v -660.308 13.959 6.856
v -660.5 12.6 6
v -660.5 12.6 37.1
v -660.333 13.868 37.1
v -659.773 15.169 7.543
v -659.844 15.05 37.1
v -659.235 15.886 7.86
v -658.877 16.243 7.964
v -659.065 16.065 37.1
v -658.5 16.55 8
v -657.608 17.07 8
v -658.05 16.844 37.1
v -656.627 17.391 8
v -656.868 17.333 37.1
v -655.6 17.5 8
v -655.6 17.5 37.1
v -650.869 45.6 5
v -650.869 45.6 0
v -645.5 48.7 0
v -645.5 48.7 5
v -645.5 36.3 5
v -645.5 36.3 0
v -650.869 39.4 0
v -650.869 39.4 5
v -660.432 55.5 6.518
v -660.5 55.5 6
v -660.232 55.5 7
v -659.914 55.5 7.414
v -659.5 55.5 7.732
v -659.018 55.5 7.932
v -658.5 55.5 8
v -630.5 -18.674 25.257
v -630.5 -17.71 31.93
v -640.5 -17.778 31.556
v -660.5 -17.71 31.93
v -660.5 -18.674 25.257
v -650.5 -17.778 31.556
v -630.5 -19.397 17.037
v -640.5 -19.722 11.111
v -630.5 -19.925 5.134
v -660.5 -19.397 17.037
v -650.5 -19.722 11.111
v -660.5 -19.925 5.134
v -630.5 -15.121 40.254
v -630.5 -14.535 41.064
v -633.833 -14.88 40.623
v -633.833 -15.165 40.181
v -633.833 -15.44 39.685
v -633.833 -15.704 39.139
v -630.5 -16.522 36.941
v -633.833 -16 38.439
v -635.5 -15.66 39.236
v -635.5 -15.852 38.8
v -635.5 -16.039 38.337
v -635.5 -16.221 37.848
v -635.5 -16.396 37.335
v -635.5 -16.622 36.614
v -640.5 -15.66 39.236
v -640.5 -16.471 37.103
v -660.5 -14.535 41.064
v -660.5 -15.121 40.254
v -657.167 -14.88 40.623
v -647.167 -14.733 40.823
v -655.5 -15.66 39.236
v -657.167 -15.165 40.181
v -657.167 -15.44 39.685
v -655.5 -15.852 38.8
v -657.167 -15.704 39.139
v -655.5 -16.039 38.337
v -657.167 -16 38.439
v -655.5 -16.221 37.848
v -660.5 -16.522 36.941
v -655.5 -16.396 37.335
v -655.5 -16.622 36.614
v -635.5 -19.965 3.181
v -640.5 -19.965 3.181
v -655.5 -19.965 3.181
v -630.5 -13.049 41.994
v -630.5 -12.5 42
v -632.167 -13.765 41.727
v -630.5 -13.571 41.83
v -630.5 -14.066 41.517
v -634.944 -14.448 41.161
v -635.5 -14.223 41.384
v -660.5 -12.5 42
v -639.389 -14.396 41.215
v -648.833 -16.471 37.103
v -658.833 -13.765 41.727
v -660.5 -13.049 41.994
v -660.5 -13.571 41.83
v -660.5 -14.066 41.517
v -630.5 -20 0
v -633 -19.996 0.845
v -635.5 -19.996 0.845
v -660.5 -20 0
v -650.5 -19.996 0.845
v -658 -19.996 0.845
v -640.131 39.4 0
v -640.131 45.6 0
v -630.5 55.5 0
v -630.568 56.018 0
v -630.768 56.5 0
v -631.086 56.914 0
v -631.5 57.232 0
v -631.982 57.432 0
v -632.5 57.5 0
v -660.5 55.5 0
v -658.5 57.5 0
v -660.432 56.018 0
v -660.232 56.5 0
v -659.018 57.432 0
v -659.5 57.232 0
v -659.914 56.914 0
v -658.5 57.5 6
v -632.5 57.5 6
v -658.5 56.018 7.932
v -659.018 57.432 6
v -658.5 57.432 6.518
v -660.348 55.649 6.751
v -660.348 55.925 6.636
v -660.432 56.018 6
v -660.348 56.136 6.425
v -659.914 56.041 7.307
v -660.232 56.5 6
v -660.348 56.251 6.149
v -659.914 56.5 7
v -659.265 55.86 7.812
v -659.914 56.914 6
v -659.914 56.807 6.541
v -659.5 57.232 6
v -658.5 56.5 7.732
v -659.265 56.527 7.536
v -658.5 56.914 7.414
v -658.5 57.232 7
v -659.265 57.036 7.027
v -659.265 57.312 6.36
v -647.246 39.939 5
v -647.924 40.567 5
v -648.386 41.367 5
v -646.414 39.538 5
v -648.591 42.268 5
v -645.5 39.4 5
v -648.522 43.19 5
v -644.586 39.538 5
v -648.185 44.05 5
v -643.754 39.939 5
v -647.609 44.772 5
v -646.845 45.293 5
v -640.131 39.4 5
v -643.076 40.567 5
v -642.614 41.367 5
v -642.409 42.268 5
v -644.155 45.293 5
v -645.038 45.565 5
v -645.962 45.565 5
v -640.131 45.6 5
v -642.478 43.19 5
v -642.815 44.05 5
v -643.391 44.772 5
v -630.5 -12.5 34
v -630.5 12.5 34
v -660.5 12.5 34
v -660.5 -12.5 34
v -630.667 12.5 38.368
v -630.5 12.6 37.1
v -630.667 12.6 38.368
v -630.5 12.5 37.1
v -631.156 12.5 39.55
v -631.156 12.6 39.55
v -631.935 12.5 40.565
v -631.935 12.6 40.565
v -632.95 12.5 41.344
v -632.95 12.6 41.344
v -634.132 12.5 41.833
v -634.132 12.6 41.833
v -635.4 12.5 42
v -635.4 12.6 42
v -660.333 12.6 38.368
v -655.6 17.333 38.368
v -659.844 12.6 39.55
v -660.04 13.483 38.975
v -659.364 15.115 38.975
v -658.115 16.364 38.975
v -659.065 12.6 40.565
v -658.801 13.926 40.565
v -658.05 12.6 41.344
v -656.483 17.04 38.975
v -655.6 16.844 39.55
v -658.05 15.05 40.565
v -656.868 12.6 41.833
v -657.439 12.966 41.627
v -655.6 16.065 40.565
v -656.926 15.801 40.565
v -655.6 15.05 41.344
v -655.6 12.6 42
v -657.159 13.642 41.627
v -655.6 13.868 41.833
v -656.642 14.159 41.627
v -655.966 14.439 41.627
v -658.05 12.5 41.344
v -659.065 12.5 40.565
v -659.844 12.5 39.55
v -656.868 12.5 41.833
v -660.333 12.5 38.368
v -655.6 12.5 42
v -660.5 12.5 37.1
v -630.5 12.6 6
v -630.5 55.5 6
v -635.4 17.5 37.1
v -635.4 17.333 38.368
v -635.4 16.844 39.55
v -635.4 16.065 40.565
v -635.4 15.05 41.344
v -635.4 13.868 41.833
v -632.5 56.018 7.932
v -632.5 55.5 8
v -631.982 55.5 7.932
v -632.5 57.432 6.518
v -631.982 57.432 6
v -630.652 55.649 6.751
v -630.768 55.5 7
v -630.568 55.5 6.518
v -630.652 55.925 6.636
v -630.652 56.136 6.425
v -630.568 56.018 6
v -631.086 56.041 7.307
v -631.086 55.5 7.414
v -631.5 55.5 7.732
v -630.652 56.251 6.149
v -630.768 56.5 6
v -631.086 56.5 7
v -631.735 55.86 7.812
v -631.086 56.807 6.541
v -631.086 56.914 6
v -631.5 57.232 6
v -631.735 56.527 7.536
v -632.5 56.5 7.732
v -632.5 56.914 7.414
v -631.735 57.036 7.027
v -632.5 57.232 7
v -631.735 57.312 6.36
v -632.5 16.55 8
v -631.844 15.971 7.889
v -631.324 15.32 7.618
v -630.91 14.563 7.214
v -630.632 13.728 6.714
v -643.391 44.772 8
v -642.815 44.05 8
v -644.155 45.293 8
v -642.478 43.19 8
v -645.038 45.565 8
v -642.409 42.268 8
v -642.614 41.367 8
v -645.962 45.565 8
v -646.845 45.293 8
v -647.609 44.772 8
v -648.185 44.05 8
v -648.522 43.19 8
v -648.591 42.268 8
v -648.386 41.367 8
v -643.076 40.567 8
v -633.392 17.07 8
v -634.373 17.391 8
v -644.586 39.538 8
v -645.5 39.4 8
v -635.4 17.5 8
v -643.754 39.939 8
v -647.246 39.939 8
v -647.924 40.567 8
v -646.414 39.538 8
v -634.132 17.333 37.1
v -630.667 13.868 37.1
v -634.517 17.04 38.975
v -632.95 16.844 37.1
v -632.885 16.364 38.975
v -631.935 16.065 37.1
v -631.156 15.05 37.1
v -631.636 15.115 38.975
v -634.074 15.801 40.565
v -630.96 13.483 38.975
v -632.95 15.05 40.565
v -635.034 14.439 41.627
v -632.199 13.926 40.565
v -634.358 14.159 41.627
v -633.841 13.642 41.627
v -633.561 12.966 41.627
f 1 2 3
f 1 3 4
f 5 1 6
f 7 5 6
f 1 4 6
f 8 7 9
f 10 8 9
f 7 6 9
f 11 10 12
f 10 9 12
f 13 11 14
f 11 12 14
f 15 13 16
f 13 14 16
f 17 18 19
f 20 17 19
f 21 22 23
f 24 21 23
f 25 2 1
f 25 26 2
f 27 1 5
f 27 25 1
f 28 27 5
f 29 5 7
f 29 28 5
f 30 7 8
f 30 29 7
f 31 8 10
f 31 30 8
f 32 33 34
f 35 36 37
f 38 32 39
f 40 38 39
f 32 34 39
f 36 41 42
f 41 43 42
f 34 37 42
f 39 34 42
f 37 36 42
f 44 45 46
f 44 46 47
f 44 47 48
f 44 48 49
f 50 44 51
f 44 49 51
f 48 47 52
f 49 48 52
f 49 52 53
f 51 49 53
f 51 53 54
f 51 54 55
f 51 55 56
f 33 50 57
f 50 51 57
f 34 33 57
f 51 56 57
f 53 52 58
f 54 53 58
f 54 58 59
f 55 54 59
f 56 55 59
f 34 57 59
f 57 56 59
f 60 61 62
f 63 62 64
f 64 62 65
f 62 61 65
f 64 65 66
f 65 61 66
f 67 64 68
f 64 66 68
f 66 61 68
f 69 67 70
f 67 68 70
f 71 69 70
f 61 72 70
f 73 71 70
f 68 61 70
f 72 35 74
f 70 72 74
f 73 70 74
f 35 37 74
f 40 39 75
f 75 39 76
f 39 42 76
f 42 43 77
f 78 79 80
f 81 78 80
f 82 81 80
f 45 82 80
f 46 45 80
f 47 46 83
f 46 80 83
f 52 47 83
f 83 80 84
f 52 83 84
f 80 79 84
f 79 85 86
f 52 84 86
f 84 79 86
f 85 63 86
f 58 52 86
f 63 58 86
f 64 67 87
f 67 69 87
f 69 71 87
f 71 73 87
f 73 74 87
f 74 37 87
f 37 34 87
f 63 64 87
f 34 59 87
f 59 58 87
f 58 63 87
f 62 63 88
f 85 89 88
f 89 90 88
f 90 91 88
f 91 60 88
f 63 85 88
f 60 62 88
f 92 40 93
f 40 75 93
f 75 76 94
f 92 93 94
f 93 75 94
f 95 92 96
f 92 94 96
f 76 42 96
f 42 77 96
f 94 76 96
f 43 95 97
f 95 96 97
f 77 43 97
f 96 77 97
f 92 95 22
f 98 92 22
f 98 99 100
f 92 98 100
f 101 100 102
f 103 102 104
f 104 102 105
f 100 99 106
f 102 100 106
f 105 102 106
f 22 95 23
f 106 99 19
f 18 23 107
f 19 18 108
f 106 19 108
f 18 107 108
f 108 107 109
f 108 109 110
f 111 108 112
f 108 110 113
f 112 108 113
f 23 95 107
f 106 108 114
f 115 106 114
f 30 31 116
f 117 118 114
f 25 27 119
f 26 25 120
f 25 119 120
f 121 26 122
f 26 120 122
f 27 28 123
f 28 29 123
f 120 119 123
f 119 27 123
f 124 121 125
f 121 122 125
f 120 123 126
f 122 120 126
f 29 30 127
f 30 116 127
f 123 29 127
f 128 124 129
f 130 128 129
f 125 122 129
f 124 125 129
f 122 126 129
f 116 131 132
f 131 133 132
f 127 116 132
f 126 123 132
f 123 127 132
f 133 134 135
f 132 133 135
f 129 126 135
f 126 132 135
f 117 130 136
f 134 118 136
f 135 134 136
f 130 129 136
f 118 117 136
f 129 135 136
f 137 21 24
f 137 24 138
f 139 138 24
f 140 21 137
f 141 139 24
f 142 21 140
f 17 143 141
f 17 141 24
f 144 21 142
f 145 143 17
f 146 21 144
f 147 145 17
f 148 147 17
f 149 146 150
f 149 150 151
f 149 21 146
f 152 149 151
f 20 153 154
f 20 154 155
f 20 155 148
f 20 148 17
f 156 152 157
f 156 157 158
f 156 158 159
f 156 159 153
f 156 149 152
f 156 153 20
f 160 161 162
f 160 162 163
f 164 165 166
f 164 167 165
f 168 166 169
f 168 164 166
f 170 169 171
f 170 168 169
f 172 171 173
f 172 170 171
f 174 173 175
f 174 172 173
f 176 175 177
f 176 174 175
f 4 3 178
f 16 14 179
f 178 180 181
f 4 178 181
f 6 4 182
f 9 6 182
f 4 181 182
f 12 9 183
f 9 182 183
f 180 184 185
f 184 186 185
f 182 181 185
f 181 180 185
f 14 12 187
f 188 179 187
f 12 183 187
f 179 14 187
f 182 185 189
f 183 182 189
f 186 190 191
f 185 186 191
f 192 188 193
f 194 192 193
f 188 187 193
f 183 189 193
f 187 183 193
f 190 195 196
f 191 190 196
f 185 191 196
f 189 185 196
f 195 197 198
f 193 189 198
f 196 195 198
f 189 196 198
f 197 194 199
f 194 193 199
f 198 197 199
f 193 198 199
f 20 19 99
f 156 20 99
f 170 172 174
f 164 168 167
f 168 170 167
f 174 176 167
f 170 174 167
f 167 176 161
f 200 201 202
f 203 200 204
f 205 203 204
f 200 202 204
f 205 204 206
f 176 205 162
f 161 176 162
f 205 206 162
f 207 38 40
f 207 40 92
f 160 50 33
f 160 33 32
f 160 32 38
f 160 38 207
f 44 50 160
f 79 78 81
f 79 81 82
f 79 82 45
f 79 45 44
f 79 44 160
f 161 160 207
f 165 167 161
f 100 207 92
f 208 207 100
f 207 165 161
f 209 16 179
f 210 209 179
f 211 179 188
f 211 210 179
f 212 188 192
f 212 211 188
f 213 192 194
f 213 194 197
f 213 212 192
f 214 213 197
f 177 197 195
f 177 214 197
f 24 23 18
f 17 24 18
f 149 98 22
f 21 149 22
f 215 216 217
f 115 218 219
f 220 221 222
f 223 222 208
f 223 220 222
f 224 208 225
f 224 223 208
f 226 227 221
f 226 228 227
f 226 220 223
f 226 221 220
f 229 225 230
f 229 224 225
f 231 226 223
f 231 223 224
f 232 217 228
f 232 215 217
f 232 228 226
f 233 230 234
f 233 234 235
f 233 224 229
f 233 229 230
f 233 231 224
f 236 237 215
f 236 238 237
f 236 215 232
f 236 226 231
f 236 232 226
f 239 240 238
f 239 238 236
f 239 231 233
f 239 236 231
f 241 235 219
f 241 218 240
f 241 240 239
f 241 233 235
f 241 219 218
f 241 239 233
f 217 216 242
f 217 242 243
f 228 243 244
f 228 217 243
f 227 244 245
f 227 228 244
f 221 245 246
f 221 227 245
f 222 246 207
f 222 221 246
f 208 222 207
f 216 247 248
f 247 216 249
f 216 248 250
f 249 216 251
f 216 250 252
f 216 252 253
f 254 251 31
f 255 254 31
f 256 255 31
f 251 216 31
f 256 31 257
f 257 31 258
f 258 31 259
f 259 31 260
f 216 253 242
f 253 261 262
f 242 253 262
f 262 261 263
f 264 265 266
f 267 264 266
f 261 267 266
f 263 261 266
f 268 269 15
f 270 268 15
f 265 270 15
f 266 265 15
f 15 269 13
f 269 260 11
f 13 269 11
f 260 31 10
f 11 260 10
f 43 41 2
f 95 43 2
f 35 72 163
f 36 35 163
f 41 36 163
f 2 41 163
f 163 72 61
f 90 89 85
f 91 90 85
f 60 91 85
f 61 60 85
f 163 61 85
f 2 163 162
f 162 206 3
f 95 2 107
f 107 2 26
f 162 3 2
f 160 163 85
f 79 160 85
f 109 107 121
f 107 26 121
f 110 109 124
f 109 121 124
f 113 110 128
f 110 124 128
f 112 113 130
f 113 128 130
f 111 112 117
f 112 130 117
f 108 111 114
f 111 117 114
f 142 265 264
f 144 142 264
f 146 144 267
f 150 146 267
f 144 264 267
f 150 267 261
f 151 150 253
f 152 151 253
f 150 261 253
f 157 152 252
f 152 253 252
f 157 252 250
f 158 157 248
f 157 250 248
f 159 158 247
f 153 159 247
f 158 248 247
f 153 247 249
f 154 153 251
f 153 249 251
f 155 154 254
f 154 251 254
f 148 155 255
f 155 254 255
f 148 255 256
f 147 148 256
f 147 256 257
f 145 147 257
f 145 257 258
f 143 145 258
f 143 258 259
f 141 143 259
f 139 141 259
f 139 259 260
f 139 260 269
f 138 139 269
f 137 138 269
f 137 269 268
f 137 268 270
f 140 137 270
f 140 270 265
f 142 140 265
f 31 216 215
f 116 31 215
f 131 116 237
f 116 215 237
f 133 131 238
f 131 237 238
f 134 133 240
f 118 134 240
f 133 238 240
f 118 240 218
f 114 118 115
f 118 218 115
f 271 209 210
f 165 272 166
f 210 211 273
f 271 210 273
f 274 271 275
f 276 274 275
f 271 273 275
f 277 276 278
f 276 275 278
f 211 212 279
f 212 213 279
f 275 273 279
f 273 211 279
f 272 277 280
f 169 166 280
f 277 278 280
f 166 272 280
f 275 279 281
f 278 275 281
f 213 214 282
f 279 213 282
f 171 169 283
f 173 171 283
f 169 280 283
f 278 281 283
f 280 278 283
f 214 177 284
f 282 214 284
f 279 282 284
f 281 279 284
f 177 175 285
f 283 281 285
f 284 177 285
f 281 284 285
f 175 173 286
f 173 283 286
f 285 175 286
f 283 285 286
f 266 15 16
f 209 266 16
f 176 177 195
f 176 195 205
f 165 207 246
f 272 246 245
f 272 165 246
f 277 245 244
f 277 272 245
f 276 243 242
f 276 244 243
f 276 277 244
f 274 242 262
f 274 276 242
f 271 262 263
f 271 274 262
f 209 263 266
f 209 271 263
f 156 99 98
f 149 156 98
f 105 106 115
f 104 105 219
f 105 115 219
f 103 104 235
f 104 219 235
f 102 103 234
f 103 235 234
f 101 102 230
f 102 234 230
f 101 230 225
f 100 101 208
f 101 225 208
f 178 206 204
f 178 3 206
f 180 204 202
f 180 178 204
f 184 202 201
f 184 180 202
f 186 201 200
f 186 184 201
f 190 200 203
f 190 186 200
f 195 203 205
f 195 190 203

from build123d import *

# Parameters (mm, degrees)
PAD002_DEPTH    = 30
SKETCH009_R     = 3.1
POCKET004_DEPTH = 8.001
POCKET005_DEPTH = 5
FILLET005_R     = 4.9
FILLET006_R     = 4.9
FILLET007_R     = 2


with BuildPart() as part:
    # Sketch008 → Pad002 (new body)
    with BuildSketch(Plane.YZ):
        with BuildLine():
            add(Edge.make_bspline(
                [(-12.5, 42), (-20, 43), (-20, 0), (-20, 0)],
                knots=[0, 0, 0, 0, 1, 1, 1, 1], degree=3))
            Line((-20, 0), (57.5, 0))
            Line((57.5, 0), (57.5, 8))
            Line((57.5, 8), (17.5, 8))
            Line((17.5, 8), (17.5, 42))
            Line((17.5, 42), (12.5, 42))
            Line((12.5, 42), (12.5, 34))
            Line((12.5, 34), (-12.5, 34))
            Line((-12.5, 34), (-12.5, 42))
        make_face()
    extrude(amount=PAD002_DEPTH)

    # Sketch009 (on Face4 of Pad002) → Pocket004 (cut, through all)
    with BuildSketch(Plane(origin=(0, 0, 8), x_dir=(0, -1, 0), z_dir=(0, 0, 1))):
        with Locations((-42.5, 15)):
            Circle(SKETCH009_R)
    extrude(amount=-POCKET004_DEPTH, mode=Mode.SUBTRACT)

    # Sketch010 (on Face3 of Pocket004) → Pocket005 (cut)
    with BuildSketch(Plane.YX):
        Polygon((48.7, 14.99998), (45.600017, 20.369348), (39.400017, 20.369367), (36.3, 15.00002), (39.399983, 9.630652), (45.599983, 9.630633), align=None)
    extrude(amount=-POCKET005_DEPTH, mode=Mode.SUBTRACT)

    # Fillet005
    fillet005_edges = [part.edges().sort_by_distance(p)[0] for p in [
        (30, 17.5, 25),
        (0, 17.5, 25),
    ]]
    fillet(fillet005_edges, radius=FILLET005_R)

    # Fillet006
    fillet006_edges = [part.edges().sort_by_distance(p)[0] for p in [
        (15, 17.5, 42),
    ]]
    fillet(fillet006_edges, radius=FILLET006_R)

    # Fillet007
    fillet007_edges = [part.edges().sort_by_distance(p)[0] for p in [
        (15, 57.5, 8),
        (0, 37.5, 8),
        (30, 37.5, 8),
        (30, 57.5, 4),
        (0, 57.5, 4),
    ]]
    fillet(fillet007_edges, radius=FILLET007_R)


with BuildPart() as part_1:
    # Body005 placement: moved
    add(part.part.moved(Location((-660.5, 0, 0))))


solid = part_1.part
